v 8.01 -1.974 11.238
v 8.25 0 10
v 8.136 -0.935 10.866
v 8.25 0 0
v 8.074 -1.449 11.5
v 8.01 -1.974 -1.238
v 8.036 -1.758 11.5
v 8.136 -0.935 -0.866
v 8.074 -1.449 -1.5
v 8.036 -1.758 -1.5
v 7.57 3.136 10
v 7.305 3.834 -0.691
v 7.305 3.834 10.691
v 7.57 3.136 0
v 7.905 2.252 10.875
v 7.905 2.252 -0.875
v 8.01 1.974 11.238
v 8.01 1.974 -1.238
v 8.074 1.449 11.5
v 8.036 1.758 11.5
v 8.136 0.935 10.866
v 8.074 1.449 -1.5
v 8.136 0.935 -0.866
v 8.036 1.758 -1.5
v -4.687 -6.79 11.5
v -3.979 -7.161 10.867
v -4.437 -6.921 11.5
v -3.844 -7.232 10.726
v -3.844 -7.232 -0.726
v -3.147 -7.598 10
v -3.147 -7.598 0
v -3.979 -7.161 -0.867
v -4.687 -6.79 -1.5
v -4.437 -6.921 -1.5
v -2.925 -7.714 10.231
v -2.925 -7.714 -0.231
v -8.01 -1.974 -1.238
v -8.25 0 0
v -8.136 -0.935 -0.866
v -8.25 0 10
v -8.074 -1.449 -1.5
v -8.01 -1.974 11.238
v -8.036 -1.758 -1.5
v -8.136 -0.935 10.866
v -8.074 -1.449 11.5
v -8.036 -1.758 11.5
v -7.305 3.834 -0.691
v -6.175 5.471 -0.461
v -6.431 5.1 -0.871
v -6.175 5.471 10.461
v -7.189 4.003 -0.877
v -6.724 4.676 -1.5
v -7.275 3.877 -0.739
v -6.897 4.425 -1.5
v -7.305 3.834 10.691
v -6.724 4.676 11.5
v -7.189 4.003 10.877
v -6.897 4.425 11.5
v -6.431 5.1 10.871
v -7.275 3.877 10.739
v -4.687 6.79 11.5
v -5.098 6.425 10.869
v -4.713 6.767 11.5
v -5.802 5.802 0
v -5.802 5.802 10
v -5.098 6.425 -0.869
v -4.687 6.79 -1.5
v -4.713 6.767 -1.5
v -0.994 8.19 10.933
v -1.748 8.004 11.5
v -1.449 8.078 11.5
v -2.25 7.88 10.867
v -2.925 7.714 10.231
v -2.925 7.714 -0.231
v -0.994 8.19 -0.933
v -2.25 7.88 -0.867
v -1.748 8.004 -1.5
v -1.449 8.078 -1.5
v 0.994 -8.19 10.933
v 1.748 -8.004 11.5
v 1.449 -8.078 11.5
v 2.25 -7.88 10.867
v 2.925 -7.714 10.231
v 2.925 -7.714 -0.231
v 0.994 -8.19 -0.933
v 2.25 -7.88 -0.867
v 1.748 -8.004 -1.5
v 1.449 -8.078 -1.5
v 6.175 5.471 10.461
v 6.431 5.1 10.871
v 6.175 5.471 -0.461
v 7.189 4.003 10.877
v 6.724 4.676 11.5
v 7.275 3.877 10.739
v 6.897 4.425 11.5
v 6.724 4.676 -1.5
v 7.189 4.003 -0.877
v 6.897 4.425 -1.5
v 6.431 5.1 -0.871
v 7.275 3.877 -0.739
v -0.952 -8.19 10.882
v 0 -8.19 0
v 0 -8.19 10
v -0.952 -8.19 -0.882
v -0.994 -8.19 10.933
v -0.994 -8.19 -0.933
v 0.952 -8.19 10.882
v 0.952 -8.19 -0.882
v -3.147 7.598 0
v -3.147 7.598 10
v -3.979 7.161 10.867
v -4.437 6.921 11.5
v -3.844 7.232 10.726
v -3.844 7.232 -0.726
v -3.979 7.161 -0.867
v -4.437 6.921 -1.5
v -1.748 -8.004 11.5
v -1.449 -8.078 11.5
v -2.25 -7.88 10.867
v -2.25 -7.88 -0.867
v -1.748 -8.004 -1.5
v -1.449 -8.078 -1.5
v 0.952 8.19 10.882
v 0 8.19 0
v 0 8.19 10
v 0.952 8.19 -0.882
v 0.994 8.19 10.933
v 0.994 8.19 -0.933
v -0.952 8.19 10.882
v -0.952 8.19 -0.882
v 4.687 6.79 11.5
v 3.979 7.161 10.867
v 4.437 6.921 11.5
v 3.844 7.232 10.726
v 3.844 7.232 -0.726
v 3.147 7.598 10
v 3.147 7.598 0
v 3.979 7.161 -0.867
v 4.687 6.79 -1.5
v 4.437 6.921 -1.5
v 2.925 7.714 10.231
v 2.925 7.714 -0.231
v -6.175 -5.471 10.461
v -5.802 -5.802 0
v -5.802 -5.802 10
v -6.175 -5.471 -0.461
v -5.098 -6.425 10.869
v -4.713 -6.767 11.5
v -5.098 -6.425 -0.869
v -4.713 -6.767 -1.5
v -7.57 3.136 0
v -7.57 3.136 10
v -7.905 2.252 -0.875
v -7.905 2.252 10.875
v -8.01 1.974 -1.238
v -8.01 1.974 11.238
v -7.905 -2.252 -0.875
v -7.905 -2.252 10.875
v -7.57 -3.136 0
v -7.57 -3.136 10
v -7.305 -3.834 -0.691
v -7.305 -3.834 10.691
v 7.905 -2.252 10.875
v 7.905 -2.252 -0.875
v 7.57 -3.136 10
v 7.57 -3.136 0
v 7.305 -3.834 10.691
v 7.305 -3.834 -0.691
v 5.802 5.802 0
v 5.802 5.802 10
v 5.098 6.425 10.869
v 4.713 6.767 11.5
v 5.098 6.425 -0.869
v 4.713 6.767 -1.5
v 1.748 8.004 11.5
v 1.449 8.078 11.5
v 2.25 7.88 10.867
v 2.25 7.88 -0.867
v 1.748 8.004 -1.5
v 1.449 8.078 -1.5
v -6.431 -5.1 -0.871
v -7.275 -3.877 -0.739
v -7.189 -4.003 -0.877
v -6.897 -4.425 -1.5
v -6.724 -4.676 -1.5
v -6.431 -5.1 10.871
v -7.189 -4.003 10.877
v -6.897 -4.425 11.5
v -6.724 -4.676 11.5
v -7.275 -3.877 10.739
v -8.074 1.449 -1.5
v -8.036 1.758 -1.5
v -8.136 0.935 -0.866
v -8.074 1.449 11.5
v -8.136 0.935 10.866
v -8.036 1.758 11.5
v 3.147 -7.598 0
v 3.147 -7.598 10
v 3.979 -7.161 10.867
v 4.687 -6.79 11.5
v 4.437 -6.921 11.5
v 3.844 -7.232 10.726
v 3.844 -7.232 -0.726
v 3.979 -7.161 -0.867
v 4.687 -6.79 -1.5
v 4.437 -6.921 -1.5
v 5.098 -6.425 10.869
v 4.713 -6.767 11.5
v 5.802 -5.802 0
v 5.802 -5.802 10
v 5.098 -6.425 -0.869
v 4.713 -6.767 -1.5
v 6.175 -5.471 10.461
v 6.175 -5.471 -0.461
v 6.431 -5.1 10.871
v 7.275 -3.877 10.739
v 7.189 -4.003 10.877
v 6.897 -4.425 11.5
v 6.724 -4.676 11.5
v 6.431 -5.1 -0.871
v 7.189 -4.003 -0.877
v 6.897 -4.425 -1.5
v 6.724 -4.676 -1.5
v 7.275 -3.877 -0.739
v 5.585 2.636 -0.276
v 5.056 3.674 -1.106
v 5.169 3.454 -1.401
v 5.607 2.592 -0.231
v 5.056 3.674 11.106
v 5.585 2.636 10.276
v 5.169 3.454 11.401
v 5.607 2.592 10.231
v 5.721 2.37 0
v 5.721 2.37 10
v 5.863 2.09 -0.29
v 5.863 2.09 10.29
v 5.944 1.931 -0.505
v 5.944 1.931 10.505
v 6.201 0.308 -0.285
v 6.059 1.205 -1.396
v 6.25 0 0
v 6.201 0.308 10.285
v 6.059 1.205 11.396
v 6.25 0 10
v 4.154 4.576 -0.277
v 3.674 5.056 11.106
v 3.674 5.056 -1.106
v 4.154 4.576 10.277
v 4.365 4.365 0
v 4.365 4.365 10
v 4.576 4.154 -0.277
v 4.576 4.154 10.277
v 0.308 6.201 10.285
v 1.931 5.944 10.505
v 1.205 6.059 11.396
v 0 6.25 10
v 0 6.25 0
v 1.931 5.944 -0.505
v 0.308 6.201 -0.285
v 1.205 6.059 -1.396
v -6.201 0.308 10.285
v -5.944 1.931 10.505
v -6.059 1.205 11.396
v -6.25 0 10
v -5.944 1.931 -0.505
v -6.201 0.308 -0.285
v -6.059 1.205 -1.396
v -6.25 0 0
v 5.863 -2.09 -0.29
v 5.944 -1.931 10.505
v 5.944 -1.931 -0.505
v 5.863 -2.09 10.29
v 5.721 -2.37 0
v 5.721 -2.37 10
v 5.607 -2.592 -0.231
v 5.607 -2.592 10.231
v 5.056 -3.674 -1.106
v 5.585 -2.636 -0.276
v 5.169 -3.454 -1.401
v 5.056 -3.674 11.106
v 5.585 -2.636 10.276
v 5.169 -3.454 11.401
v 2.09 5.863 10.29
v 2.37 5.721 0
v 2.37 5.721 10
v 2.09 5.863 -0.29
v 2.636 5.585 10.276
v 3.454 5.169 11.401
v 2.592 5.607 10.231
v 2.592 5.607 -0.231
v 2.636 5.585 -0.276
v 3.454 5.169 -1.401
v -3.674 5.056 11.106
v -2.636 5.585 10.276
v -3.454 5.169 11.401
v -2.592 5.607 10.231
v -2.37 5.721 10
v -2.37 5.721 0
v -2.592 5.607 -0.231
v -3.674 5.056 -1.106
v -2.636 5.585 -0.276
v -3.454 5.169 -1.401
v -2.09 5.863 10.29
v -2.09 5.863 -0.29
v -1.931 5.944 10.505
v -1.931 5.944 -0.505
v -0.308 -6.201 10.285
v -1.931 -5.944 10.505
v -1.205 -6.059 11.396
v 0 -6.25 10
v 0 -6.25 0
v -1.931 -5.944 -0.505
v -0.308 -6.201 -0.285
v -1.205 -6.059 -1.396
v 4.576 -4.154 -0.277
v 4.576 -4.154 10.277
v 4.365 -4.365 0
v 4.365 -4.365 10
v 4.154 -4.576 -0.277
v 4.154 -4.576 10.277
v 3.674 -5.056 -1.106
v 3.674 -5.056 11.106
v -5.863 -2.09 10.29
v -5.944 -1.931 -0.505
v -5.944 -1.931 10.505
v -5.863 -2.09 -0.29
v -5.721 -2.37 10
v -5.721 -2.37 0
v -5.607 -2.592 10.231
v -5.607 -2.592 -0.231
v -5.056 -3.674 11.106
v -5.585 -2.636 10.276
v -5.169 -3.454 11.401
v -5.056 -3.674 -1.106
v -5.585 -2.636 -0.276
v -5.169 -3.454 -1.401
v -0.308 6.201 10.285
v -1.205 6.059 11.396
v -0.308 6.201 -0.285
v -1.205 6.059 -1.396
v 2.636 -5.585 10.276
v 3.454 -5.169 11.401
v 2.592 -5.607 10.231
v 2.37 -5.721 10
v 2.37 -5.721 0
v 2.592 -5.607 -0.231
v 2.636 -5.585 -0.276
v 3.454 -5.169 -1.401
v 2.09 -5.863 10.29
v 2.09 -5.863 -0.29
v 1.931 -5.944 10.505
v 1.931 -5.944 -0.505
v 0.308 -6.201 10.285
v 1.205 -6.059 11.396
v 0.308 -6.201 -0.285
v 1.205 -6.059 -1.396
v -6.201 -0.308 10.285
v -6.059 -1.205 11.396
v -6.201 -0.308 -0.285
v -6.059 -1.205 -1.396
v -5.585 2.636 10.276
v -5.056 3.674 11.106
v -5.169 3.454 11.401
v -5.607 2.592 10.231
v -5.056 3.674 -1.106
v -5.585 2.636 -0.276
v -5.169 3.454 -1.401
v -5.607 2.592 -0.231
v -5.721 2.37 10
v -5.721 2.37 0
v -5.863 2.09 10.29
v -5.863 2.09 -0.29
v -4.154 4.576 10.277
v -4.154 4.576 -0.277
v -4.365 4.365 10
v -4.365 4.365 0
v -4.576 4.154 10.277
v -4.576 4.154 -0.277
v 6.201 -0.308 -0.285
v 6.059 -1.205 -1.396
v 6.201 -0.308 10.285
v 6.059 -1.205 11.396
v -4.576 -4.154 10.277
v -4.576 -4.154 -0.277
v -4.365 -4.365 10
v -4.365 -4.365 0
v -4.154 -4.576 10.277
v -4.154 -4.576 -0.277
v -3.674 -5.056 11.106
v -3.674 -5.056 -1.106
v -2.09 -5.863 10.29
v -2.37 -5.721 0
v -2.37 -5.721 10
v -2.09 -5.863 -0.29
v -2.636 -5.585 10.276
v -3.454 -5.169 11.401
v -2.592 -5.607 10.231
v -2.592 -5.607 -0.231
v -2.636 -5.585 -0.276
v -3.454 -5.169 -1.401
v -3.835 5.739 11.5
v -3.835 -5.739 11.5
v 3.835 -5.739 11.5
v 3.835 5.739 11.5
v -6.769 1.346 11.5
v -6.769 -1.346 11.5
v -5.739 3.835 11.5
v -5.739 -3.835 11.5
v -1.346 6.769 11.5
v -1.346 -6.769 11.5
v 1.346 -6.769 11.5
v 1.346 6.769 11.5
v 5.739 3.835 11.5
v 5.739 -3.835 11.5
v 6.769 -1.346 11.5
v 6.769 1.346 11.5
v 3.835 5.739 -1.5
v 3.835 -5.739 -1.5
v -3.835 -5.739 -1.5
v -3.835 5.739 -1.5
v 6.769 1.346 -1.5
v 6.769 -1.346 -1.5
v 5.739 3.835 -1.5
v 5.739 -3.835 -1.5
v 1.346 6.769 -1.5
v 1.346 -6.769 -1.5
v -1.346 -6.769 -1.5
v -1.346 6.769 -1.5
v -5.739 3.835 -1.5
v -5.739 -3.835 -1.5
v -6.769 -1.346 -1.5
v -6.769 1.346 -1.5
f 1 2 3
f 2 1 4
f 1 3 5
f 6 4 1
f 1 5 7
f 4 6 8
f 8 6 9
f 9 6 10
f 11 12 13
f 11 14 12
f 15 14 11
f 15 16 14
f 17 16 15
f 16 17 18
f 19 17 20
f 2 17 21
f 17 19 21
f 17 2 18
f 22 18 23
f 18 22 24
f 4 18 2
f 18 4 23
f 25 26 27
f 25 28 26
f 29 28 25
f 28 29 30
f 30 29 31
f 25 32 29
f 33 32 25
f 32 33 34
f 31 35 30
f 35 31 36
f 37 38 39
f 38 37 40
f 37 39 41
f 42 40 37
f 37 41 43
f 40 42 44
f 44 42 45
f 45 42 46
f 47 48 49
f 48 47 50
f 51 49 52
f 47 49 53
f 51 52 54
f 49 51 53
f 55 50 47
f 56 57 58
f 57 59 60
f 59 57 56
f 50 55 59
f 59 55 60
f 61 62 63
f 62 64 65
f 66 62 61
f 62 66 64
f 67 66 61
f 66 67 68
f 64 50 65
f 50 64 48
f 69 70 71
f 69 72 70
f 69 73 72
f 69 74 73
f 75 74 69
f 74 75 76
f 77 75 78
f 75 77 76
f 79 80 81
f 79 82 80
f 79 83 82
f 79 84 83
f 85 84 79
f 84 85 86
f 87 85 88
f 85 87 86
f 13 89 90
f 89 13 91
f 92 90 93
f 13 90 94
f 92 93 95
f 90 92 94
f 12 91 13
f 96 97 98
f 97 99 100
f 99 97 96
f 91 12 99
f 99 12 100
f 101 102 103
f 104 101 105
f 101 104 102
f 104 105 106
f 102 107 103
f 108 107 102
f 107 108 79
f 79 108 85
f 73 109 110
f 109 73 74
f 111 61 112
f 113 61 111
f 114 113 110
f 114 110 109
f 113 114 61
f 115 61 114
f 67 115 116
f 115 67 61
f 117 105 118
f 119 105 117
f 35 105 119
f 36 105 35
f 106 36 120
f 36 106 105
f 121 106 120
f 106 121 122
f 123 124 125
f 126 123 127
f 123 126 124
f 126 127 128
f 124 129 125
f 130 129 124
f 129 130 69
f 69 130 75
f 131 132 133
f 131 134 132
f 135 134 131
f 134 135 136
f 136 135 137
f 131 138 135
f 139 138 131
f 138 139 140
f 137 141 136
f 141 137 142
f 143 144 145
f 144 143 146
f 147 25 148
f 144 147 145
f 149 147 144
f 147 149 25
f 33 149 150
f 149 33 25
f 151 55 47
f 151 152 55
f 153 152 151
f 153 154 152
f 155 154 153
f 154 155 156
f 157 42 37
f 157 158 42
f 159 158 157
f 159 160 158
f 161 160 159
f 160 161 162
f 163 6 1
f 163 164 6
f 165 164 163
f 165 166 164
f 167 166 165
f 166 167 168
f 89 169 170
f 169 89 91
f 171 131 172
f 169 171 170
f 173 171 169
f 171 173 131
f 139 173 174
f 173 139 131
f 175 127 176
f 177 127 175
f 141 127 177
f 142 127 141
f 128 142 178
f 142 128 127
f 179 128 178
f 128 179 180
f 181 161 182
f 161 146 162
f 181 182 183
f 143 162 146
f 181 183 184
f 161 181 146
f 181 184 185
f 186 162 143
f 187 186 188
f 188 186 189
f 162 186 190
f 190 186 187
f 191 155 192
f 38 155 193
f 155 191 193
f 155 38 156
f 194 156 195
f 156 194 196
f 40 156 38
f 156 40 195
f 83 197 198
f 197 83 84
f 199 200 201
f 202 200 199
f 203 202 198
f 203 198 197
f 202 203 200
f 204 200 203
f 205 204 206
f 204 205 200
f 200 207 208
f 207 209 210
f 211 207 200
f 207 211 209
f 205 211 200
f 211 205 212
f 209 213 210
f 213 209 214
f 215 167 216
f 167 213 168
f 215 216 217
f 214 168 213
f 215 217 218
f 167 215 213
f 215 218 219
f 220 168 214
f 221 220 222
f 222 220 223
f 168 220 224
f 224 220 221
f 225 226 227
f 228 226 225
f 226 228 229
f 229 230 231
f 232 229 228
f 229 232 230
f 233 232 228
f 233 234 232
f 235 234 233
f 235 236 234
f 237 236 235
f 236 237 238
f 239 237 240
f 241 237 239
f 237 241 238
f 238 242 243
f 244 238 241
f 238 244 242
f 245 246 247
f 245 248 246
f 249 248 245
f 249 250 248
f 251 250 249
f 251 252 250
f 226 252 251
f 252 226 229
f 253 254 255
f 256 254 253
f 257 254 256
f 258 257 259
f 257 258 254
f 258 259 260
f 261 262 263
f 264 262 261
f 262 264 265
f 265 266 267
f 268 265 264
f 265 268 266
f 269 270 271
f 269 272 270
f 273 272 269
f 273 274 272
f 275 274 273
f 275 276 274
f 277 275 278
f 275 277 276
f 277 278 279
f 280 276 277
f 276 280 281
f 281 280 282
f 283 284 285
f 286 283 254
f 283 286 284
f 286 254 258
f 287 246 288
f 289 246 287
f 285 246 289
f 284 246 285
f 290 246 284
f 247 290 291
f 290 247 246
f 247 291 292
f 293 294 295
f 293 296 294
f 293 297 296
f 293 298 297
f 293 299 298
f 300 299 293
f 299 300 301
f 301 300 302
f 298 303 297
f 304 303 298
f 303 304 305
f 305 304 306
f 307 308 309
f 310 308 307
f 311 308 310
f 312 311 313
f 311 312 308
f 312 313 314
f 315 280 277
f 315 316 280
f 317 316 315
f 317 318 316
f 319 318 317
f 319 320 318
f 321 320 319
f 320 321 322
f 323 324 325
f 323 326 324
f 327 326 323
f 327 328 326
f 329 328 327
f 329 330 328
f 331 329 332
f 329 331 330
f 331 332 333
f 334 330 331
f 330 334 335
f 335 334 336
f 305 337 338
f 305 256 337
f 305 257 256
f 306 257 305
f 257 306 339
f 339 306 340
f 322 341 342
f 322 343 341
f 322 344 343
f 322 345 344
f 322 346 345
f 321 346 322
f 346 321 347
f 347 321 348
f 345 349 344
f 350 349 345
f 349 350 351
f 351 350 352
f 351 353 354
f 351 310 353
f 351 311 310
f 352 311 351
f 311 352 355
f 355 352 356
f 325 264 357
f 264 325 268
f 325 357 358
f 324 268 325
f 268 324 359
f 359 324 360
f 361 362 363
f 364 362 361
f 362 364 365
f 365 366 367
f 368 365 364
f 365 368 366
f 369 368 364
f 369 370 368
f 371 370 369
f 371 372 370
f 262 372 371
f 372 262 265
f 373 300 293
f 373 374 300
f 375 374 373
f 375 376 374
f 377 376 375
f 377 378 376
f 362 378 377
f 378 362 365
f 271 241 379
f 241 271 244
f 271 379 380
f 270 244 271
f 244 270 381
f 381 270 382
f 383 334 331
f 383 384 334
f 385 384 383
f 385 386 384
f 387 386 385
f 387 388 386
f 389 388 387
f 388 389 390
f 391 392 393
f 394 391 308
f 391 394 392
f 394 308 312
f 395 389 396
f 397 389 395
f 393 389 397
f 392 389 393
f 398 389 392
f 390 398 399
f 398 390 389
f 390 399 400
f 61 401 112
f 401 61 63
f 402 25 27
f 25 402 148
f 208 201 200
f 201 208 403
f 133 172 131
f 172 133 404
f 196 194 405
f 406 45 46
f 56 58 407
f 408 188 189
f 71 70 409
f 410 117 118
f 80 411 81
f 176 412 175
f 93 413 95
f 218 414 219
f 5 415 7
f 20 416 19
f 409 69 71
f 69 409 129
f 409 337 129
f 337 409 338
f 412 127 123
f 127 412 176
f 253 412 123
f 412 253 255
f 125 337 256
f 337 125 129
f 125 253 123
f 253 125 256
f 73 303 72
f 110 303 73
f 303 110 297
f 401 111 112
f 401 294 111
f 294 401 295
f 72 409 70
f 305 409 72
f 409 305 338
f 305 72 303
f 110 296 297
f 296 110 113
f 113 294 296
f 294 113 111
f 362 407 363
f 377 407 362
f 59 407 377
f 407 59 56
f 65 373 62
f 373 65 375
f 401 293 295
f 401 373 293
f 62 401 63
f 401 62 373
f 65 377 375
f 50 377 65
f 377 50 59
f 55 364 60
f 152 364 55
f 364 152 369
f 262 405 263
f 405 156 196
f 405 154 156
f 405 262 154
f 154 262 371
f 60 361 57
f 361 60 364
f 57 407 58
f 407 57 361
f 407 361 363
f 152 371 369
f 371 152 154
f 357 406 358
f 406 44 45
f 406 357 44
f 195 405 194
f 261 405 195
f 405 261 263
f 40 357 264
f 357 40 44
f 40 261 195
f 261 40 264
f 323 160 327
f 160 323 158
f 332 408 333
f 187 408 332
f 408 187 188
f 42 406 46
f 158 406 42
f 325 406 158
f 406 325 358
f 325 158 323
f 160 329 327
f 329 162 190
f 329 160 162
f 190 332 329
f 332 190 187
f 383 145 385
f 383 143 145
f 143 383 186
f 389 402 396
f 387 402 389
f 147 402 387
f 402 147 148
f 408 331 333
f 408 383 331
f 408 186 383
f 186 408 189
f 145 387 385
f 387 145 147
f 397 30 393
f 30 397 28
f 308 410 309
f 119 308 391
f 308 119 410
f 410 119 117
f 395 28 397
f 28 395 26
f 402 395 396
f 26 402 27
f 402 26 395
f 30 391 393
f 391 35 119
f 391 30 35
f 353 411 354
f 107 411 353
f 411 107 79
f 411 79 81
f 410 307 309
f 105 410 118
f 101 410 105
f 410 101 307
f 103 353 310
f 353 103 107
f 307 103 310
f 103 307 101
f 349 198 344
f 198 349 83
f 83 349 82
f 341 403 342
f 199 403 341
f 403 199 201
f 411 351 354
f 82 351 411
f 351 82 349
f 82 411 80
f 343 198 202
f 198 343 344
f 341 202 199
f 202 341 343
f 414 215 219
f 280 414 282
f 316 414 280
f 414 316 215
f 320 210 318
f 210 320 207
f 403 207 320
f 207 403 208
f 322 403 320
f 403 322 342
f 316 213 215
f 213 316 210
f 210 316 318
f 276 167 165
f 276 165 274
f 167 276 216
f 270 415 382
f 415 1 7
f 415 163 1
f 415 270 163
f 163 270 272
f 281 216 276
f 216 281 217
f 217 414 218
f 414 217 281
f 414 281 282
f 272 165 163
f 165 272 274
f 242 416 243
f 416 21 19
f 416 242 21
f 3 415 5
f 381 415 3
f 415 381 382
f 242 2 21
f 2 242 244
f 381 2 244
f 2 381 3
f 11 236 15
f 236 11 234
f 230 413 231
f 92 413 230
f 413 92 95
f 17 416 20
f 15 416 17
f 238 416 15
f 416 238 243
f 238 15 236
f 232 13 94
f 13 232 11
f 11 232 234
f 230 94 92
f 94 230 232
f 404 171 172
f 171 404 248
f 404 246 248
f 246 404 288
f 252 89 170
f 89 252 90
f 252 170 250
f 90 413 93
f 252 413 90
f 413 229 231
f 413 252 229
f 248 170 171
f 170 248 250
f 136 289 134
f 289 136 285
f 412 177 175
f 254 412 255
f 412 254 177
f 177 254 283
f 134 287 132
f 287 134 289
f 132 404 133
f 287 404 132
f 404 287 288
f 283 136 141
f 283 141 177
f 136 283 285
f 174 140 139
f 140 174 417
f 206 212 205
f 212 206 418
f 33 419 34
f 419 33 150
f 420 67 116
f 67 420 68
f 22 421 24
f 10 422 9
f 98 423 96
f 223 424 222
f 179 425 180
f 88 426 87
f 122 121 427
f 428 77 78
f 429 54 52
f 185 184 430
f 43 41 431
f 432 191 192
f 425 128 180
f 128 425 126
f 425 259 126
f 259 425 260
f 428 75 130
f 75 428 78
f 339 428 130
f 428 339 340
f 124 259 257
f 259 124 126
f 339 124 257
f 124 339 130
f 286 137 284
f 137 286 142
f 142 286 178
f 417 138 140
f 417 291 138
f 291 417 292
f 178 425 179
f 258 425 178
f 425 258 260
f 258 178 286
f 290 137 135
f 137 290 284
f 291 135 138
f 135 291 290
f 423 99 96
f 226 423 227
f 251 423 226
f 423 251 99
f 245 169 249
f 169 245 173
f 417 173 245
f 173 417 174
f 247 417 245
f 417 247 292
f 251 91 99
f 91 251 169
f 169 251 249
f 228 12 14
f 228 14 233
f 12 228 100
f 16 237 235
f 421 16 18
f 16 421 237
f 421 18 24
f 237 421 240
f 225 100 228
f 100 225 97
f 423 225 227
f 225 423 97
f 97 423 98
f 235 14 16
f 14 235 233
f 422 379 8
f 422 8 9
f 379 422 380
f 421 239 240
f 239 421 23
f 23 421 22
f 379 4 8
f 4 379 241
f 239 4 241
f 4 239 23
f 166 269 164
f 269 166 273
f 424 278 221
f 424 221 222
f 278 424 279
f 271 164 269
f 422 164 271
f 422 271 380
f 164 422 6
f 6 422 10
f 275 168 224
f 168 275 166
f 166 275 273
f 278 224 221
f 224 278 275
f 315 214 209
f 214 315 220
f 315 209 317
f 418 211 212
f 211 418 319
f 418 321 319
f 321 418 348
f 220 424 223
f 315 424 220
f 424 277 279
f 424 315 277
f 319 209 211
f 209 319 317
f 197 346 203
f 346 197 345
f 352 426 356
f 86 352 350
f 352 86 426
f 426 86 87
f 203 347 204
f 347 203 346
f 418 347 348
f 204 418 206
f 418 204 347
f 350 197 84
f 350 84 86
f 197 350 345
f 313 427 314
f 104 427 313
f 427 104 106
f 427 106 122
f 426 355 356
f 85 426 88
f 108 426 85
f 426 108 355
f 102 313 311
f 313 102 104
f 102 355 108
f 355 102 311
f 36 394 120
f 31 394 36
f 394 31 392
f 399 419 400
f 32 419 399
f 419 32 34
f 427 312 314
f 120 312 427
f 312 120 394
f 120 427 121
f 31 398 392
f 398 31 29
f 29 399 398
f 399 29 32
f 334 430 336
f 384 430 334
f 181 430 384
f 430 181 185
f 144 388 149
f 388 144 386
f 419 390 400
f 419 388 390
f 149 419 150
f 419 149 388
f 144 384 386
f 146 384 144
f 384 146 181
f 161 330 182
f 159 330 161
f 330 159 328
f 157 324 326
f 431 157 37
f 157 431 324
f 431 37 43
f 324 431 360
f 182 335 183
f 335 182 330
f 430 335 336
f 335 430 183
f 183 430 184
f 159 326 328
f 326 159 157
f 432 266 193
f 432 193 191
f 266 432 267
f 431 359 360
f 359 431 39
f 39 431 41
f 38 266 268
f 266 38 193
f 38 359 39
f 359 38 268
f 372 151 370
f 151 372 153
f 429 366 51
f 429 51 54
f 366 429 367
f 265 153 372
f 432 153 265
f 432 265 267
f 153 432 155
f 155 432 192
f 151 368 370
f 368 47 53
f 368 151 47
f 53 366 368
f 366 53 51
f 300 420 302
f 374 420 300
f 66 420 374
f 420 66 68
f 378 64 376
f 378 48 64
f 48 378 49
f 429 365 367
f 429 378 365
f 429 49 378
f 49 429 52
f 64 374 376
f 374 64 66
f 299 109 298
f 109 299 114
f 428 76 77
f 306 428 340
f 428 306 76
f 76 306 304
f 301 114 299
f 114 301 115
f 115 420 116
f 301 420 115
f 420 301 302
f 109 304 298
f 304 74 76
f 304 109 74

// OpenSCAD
// file: toothed_interlock.scad
// top mounting teeth
module toothed_interlock(inner_r, outer_r, tooth_count = 16, depth = 1.5, nil = $preview ? 0.001 : 0)
{
    tooth_inner_len = (inner_r * PI *2) / tooth_count;
    tooth_outer_len = ((outer_r) * PI *2) / tooth_count;
    tooth_thickness = outer_r - inner_r + 2;
    degrees_per_tooth = 360 / tooth_count;
    
    difference()
    {
        difference()
        {
            cylinder(h=depth, r=outer_r, center=false);
            translate([0,0,-nil])
                cylinder(h=depth + 2 * nil, r=inner_r, center=false);
        }
        translate([0, 0, depth+nil])
            for(angle = [0 : degrees_per_tooth : 360 - degrees_per_tooth])
                rotate([0,0,angle])
                    translate([0, inner_r - 1, 0])
                        rotate([90,180-90,180])
                             hull()
                            {
                                linear_extrude(1)
                                    polygon([[0,-tooth_inner_len/2],[depth,0],[0,tooth_inner_len/2]]);
                                
                                translate([0,0, tooth_thickness + 1])
                                    linear_extrude(1)
                                        polygon([[0,-tooth_outer_len/2],[depth,0],[0,tooth_outer_len/2]]);
                            }
    }
}
// main file
use <screwgen/circlestack_thread3.scad>
use <toothed_interlock.scad>


nil = $preview ? 0.001 : 0;
pole_radius = 6.25;
thickness = 2;


{
    height = 10;
    color("green")
        difference()
        {
            cylinder(h=height, r=pole_radius + thickness, center=false);
            translate([0,0,-nil])
                cylinder(h=height+ 2 * nil, r=pole_radius, center=false);
        }

    // top mounting teeth
    color("pink")        
        translate([0, 0, height - nil])
            toothed_interlock(inner_r = pole_radius, outer_r = pole_radius + thickness);
}
    
// bottom mounting teeth
rotate([0, 180, 0])
    color("purple")
        translate([0, 0, -nil])
            toothed_interlock(inner_r = pole_radius, outer_r = pole_radius + thickness);
